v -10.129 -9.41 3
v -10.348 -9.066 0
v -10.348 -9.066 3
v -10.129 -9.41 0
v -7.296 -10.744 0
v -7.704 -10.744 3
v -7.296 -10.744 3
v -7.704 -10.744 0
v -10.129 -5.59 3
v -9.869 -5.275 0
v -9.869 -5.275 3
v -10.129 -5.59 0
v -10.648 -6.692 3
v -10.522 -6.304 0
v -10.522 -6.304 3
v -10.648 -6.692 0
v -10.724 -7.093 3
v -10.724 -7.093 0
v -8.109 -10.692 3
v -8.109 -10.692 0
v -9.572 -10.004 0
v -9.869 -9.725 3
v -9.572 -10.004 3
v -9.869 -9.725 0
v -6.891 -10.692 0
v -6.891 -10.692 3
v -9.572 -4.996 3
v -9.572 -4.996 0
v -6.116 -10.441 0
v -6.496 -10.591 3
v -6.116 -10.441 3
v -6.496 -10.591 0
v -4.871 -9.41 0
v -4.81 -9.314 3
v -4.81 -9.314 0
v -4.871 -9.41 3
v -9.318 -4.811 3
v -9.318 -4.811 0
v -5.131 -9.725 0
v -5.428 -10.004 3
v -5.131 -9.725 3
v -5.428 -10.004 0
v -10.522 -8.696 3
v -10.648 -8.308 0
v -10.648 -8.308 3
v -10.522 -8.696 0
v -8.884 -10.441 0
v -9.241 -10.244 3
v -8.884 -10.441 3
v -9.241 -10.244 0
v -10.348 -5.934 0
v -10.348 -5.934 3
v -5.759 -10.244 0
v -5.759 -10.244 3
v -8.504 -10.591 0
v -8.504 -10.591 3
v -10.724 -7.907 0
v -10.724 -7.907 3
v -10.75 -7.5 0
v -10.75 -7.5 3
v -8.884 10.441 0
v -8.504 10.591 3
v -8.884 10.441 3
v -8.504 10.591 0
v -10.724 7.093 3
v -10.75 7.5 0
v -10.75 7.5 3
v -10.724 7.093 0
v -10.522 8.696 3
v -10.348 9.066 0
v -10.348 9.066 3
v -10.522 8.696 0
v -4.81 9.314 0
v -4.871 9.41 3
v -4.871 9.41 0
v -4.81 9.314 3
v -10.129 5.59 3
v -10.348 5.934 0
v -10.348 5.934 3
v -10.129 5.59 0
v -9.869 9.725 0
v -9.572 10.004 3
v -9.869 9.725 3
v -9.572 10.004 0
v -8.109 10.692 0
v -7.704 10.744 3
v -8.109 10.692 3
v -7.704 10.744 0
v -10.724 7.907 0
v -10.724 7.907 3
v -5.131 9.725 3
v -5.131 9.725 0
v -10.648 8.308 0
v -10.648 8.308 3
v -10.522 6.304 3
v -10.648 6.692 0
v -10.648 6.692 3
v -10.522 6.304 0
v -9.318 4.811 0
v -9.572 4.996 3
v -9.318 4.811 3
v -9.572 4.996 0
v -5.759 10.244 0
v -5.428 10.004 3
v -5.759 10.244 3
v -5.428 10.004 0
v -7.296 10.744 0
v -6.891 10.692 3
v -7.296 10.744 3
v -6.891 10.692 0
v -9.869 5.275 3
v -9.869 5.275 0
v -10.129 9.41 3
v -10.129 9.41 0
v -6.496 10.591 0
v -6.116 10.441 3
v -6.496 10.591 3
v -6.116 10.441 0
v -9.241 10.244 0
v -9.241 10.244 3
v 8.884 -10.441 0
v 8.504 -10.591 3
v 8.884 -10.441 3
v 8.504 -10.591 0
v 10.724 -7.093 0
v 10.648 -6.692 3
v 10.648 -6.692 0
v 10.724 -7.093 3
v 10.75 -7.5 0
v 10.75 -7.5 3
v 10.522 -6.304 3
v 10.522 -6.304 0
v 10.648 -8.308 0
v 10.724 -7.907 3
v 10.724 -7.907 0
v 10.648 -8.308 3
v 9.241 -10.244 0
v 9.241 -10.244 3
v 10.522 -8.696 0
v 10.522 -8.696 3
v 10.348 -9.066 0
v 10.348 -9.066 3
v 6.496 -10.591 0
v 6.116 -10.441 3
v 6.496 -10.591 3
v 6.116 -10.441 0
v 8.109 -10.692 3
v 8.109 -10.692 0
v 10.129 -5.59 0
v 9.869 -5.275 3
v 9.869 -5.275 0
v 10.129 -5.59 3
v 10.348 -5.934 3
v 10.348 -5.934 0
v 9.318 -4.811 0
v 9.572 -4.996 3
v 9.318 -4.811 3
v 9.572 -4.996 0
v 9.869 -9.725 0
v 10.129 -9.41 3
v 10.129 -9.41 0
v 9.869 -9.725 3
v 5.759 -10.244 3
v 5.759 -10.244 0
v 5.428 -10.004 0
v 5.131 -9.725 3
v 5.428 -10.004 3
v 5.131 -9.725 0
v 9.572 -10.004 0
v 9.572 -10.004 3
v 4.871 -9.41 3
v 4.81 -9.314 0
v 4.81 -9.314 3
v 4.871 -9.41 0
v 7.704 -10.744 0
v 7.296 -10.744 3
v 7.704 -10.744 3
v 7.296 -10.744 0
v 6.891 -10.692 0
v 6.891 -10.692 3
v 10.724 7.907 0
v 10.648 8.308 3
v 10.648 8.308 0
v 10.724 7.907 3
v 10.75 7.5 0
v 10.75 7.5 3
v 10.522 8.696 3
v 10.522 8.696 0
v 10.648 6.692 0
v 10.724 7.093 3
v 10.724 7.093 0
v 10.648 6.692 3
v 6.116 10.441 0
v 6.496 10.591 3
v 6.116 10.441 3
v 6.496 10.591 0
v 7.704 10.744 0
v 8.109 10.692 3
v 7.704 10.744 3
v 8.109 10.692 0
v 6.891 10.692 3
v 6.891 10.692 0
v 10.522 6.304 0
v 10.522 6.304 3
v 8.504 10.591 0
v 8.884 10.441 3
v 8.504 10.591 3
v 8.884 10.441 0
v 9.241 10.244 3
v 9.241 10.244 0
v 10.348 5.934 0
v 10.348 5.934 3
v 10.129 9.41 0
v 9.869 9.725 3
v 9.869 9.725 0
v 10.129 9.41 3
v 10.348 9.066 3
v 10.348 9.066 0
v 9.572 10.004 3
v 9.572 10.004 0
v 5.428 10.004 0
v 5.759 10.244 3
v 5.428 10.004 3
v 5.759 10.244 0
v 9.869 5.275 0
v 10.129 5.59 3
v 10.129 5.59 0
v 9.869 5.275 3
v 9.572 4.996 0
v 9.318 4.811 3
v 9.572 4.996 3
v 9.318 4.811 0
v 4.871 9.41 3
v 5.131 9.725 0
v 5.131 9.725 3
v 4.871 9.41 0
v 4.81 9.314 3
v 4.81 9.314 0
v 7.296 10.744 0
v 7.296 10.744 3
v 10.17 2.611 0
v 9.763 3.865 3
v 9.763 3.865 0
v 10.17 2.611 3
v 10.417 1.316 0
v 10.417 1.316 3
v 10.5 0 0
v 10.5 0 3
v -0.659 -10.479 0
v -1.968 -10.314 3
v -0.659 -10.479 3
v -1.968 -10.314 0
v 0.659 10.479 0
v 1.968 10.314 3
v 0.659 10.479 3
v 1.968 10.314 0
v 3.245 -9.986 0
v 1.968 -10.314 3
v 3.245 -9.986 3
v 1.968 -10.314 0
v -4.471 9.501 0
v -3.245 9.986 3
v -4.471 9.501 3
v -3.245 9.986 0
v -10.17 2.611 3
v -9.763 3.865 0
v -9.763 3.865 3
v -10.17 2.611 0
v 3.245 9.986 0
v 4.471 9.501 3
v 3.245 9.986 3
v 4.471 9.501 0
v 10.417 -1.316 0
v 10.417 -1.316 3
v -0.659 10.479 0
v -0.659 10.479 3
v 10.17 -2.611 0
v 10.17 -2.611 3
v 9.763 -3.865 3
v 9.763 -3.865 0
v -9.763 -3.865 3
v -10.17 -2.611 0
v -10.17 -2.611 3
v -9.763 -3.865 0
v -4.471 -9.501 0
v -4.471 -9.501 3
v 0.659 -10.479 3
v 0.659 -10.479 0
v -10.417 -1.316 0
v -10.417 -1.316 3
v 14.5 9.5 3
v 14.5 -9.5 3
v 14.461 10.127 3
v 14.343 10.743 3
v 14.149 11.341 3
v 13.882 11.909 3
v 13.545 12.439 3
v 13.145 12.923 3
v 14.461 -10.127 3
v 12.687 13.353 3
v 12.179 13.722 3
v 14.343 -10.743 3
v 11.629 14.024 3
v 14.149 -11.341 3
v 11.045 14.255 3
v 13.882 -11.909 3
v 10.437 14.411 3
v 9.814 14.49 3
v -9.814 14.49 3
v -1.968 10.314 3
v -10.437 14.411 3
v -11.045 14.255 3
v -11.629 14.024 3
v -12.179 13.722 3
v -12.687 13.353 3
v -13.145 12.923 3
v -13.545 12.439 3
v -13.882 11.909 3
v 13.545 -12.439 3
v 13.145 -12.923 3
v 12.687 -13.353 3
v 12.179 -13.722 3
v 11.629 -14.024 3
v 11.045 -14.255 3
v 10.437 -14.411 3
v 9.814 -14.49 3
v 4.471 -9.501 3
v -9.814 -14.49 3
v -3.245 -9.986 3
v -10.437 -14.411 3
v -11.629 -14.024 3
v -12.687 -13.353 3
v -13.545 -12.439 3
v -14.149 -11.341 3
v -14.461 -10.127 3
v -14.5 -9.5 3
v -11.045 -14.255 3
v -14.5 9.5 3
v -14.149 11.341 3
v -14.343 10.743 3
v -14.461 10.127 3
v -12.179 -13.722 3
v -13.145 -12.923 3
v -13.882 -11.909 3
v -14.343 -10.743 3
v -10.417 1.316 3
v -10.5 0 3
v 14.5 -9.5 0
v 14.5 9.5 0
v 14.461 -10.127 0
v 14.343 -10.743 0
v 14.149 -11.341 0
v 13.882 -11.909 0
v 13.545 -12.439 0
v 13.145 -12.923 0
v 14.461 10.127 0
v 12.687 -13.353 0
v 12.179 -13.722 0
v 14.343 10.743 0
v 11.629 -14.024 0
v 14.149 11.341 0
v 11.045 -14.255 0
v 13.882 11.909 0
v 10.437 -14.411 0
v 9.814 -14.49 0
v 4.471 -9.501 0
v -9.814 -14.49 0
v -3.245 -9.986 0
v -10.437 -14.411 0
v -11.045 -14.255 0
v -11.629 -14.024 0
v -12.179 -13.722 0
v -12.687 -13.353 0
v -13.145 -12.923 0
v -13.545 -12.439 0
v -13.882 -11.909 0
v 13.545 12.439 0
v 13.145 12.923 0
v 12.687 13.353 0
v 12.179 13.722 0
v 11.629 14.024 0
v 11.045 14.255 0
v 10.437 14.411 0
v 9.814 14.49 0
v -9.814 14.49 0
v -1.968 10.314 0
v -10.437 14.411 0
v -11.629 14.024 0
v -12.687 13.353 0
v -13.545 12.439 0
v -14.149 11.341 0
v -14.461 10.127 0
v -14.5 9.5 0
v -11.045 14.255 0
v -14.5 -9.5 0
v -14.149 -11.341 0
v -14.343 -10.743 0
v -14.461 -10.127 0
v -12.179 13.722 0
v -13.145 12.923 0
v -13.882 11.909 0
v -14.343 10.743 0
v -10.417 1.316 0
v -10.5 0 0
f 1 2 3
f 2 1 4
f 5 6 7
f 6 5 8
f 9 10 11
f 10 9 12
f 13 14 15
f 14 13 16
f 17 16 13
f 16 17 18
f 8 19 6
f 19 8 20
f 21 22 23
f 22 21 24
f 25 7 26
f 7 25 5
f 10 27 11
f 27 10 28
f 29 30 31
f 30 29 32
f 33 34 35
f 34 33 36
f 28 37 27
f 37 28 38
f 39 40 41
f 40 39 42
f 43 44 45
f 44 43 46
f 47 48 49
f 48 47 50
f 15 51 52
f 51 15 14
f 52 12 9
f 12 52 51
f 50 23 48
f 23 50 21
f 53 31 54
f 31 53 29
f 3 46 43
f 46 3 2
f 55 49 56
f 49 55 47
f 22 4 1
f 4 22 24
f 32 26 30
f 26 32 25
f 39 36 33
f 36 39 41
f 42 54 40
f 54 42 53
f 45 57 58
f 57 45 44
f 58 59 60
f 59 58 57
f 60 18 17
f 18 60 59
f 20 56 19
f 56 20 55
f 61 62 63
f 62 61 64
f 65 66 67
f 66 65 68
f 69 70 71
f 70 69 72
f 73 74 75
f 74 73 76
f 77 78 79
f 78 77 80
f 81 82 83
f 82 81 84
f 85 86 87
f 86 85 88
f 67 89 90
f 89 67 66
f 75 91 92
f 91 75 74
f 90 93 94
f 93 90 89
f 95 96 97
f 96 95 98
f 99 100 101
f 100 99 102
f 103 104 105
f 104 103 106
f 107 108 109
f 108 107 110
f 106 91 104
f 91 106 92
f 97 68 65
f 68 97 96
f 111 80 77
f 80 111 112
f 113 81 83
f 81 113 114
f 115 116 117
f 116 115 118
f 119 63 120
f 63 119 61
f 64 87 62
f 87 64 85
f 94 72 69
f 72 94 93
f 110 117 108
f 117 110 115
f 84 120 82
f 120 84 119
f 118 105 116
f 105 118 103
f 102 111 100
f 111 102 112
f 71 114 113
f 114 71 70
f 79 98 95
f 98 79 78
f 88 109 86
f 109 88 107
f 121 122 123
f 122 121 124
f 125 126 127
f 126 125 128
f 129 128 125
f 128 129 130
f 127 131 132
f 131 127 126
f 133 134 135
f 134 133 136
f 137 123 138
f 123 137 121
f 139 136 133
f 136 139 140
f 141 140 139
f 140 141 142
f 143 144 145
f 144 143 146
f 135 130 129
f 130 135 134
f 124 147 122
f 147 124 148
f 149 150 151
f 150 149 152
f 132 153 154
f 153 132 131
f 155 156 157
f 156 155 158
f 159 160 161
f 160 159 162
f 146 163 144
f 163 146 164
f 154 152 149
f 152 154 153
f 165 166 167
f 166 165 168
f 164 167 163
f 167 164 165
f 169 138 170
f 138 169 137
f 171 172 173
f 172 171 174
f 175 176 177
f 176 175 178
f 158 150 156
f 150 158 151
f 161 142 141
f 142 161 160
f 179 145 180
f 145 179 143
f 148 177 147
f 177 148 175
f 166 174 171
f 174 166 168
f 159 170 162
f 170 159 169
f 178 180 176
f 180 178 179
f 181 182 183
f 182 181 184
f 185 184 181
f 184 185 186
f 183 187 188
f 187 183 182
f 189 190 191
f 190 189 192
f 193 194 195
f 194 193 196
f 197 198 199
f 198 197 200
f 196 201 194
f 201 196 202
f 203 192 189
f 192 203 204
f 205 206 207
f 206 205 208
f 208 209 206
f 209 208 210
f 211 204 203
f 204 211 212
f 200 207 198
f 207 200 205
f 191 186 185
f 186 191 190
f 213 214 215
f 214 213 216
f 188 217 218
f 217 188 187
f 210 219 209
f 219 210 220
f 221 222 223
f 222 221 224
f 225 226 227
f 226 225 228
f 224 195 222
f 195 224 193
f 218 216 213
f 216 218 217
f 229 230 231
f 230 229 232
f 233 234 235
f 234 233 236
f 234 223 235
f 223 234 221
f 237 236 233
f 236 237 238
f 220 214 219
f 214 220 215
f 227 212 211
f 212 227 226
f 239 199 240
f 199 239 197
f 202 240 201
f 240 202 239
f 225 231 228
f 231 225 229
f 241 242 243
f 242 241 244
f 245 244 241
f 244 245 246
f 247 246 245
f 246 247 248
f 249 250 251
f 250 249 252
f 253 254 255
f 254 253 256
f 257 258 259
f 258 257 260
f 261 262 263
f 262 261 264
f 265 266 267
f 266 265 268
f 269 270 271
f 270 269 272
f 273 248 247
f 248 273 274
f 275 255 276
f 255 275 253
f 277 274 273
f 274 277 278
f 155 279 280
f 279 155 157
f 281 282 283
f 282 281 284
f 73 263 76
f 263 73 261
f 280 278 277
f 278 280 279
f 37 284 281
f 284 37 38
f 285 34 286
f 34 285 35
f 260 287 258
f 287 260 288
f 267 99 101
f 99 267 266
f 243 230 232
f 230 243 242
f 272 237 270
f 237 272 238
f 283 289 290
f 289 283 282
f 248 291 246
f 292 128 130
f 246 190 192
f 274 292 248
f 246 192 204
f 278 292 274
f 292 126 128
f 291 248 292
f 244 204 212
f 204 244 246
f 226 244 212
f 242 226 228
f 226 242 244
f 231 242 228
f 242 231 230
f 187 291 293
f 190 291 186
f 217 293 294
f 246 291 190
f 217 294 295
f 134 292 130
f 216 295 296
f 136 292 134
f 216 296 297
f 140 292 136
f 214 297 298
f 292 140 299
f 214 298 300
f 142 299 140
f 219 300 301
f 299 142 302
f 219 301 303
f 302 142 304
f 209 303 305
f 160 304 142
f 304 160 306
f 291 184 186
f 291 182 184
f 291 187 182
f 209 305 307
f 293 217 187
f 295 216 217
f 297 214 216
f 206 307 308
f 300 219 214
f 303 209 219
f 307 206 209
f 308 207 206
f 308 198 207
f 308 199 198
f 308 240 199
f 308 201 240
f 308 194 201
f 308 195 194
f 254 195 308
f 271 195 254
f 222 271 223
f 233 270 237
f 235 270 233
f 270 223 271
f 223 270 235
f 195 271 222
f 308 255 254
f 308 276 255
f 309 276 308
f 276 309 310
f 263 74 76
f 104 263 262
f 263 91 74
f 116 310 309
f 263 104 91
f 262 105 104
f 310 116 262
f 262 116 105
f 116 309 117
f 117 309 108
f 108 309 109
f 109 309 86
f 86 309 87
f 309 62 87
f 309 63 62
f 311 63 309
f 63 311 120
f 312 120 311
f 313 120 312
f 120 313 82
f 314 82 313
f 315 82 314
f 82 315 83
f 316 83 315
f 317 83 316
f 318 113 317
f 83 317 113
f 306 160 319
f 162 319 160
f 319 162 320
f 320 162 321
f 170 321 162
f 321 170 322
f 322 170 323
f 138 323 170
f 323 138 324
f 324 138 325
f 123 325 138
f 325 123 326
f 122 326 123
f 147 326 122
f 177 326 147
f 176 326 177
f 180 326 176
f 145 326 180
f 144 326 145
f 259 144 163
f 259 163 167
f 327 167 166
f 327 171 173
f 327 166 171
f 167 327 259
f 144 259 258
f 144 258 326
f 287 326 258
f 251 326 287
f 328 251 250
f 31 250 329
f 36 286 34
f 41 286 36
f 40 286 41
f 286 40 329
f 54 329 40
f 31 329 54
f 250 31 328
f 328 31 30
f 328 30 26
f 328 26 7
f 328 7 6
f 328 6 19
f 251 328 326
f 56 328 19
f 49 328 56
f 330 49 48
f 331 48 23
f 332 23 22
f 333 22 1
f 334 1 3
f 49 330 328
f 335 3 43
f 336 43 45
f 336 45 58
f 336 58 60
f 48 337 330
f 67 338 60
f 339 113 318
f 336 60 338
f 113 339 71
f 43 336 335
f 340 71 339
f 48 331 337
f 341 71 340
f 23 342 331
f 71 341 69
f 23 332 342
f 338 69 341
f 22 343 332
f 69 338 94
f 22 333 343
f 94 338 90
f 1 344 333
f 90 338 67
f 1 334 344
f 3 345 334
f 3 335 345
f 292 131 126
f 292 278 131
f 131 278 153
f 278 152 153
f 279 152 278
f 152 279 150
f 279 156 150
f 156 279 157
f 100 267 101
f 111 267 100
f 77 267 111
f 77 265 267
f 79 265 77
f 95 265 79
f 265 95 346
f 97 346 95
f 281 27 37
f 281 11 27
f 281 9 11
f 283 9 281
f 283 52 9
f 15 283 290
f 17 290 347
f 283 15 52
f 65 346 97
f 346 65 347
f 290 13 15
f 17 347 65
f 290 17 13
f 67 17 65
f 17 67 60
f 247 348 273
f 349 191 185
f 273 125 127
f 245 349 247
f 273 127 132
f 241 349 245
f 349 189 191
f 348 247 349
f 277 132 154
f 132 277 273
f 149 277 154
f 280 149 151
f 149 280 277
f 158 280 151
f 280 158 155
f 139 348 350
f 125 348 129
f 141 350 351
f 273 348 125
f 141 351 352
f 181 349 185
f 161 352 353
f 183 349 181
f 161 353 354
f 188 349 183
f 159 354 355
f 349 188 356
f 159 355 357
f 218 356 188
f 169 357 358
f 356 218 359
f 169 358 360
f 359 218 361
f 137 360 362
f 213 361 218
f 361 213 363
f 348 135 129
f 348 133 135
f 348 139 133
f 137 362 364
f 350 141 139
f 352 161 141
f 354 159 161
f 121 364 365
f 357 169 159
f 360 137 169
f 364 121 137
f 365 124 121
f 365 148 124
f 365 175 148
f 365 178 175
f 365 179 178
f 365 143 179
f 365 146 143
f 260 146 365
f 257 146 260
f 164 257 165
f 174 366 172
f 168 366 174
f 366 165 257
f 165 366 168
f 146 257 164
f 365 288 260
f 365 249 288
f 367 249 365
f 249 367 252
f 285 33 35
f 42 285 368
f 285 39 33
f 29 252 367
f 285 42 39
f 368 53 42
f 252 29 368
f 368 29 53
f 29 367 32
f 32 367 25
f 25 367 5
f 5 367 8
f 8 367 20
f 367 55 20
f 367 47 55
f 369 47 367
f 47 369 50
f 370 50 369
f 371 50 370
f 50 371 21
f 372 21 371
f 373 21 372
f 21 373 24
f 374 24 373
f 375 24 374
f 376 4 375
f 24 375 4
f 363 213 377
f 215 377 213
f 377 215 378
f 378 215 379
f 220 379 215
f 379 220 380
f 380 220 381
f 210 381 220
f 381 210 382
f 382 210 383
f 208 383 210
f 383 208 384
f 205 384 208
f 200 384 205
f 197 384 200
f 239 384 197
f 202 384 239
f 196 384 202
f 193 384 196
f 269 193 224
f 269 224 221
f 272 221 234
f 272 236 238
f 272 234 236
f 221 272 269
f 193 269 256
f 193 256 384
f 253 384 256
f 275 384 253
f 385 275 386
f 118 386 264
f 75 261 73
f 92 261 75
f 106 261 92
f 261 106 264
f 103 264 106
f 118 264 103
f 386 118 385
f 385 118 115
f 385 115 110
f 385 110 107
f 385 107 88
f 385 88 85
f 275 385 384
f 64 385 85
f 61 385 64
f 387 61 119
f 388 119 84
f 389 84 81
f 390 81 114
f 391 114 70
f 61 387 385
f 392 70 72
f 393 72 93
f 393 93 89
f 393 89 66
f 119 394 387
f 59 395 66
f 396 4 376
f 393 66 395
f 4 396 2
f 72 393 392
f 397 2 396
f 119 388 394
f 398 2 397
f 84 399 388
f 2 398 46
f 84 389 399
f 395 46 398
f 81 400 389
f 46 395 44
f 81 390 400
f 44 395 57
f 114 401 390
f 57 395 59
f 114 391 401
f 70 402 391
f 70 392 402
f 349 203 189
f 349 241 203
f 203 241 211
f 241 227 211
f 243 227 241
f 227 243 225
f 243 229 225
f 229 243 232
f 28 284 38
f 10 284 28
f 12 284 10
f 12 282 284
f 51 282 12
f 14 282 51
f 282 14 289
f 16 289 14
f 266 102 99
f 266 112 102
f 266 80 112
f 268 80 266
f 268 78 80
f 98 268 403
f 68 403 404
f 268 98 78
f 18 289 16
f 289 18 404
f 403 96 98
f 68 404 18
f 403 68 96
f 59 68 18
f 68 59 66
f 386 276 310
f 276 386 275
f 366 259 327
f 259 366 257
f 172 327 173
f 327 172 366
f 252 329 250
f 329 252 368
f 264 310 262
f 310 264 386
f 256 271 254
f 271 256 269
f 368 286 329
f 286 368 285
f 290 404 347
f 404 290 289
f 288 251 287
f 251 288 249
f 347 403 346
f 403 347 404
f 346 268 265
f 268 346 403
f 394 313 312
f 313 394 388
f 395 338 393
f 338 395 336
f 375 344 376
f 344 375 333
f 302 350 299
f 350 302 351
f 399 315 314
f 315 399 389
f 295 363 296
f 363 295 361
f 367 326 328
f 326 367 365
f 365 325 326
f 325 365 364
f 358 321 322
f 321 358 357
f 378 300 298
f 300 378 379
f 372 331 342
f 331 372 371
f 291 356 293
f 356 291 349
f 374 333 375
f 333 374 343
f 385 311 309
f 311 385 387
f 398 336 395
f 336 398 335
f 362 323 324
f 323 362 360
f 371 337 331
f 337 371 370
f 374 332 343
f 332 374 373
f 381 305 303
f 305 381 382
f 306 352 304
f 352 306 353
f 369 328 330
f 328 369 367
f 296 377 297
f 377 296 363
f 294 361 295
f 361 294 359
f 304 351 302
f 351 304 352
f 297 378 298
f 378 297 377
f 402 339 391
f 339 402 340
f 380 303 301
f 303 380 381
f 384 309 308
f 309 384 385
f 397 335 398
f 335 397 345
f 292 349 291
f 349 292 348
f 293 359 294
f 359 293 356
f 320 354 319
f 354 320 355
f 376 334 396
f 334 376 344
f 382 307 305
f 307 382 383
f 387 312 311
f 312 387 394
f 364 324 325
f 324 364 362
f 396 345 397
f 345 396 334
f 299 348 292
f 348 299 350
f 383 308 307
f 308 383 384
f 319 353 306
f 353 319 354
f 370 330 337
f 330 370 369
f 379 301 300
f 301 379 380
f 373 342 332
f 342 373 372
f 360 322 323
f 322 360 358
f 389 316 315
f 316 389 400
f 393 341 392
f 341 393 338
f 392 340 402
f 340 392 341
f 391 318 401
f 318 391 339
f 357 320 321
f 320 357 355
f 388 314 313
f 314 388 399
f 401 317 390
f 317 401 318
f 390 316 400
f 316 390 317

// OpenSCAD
$fn = 50;


difference() {
	union() {
		hull() {
			translate(v = [-9.5000000000, 9.5000000000, 0]) {
				cylinder(h = 3, r = 5);
			}
			translate(v = [9.5000000000, 9.5000000000, 0]) {
				cylinder(h = 3, r = 5);
			}
			translate(v = [-9.5000000000, -9.5000000000, 0]) {
				cylinder(h = 3, r = 5);
			}
			translate(v = [9.5000000000, -9.5000000000, 0]) {
				cylinder(h = 3, r = 5);
			}
		}
	}
	union() {
		#translate(v = [-7.5000000000, -7.5000000000, -100.0000000000]) {
			cylinder(h = 200, r = 3.2500000000);
		}
		#translate(v = [-7.5000000000, 7.5000000000, -100.0000000000]) {
			cylinder(h = 200, r = 3.2500000000);
		}
		#translate(v = [7.5000000000, -7.5000000000, -100.0000000000]) {
			cylinder(h = 200, r = 3.2500000000);
		}
		#translate(v = [7.5000000000, 7.5000000000, -100.0000000000]) {
			cylinder(h = 200, r = 3.2500000000);
		}
		#cylinder(h = 3, r = 10.5000000000);
	}
}
